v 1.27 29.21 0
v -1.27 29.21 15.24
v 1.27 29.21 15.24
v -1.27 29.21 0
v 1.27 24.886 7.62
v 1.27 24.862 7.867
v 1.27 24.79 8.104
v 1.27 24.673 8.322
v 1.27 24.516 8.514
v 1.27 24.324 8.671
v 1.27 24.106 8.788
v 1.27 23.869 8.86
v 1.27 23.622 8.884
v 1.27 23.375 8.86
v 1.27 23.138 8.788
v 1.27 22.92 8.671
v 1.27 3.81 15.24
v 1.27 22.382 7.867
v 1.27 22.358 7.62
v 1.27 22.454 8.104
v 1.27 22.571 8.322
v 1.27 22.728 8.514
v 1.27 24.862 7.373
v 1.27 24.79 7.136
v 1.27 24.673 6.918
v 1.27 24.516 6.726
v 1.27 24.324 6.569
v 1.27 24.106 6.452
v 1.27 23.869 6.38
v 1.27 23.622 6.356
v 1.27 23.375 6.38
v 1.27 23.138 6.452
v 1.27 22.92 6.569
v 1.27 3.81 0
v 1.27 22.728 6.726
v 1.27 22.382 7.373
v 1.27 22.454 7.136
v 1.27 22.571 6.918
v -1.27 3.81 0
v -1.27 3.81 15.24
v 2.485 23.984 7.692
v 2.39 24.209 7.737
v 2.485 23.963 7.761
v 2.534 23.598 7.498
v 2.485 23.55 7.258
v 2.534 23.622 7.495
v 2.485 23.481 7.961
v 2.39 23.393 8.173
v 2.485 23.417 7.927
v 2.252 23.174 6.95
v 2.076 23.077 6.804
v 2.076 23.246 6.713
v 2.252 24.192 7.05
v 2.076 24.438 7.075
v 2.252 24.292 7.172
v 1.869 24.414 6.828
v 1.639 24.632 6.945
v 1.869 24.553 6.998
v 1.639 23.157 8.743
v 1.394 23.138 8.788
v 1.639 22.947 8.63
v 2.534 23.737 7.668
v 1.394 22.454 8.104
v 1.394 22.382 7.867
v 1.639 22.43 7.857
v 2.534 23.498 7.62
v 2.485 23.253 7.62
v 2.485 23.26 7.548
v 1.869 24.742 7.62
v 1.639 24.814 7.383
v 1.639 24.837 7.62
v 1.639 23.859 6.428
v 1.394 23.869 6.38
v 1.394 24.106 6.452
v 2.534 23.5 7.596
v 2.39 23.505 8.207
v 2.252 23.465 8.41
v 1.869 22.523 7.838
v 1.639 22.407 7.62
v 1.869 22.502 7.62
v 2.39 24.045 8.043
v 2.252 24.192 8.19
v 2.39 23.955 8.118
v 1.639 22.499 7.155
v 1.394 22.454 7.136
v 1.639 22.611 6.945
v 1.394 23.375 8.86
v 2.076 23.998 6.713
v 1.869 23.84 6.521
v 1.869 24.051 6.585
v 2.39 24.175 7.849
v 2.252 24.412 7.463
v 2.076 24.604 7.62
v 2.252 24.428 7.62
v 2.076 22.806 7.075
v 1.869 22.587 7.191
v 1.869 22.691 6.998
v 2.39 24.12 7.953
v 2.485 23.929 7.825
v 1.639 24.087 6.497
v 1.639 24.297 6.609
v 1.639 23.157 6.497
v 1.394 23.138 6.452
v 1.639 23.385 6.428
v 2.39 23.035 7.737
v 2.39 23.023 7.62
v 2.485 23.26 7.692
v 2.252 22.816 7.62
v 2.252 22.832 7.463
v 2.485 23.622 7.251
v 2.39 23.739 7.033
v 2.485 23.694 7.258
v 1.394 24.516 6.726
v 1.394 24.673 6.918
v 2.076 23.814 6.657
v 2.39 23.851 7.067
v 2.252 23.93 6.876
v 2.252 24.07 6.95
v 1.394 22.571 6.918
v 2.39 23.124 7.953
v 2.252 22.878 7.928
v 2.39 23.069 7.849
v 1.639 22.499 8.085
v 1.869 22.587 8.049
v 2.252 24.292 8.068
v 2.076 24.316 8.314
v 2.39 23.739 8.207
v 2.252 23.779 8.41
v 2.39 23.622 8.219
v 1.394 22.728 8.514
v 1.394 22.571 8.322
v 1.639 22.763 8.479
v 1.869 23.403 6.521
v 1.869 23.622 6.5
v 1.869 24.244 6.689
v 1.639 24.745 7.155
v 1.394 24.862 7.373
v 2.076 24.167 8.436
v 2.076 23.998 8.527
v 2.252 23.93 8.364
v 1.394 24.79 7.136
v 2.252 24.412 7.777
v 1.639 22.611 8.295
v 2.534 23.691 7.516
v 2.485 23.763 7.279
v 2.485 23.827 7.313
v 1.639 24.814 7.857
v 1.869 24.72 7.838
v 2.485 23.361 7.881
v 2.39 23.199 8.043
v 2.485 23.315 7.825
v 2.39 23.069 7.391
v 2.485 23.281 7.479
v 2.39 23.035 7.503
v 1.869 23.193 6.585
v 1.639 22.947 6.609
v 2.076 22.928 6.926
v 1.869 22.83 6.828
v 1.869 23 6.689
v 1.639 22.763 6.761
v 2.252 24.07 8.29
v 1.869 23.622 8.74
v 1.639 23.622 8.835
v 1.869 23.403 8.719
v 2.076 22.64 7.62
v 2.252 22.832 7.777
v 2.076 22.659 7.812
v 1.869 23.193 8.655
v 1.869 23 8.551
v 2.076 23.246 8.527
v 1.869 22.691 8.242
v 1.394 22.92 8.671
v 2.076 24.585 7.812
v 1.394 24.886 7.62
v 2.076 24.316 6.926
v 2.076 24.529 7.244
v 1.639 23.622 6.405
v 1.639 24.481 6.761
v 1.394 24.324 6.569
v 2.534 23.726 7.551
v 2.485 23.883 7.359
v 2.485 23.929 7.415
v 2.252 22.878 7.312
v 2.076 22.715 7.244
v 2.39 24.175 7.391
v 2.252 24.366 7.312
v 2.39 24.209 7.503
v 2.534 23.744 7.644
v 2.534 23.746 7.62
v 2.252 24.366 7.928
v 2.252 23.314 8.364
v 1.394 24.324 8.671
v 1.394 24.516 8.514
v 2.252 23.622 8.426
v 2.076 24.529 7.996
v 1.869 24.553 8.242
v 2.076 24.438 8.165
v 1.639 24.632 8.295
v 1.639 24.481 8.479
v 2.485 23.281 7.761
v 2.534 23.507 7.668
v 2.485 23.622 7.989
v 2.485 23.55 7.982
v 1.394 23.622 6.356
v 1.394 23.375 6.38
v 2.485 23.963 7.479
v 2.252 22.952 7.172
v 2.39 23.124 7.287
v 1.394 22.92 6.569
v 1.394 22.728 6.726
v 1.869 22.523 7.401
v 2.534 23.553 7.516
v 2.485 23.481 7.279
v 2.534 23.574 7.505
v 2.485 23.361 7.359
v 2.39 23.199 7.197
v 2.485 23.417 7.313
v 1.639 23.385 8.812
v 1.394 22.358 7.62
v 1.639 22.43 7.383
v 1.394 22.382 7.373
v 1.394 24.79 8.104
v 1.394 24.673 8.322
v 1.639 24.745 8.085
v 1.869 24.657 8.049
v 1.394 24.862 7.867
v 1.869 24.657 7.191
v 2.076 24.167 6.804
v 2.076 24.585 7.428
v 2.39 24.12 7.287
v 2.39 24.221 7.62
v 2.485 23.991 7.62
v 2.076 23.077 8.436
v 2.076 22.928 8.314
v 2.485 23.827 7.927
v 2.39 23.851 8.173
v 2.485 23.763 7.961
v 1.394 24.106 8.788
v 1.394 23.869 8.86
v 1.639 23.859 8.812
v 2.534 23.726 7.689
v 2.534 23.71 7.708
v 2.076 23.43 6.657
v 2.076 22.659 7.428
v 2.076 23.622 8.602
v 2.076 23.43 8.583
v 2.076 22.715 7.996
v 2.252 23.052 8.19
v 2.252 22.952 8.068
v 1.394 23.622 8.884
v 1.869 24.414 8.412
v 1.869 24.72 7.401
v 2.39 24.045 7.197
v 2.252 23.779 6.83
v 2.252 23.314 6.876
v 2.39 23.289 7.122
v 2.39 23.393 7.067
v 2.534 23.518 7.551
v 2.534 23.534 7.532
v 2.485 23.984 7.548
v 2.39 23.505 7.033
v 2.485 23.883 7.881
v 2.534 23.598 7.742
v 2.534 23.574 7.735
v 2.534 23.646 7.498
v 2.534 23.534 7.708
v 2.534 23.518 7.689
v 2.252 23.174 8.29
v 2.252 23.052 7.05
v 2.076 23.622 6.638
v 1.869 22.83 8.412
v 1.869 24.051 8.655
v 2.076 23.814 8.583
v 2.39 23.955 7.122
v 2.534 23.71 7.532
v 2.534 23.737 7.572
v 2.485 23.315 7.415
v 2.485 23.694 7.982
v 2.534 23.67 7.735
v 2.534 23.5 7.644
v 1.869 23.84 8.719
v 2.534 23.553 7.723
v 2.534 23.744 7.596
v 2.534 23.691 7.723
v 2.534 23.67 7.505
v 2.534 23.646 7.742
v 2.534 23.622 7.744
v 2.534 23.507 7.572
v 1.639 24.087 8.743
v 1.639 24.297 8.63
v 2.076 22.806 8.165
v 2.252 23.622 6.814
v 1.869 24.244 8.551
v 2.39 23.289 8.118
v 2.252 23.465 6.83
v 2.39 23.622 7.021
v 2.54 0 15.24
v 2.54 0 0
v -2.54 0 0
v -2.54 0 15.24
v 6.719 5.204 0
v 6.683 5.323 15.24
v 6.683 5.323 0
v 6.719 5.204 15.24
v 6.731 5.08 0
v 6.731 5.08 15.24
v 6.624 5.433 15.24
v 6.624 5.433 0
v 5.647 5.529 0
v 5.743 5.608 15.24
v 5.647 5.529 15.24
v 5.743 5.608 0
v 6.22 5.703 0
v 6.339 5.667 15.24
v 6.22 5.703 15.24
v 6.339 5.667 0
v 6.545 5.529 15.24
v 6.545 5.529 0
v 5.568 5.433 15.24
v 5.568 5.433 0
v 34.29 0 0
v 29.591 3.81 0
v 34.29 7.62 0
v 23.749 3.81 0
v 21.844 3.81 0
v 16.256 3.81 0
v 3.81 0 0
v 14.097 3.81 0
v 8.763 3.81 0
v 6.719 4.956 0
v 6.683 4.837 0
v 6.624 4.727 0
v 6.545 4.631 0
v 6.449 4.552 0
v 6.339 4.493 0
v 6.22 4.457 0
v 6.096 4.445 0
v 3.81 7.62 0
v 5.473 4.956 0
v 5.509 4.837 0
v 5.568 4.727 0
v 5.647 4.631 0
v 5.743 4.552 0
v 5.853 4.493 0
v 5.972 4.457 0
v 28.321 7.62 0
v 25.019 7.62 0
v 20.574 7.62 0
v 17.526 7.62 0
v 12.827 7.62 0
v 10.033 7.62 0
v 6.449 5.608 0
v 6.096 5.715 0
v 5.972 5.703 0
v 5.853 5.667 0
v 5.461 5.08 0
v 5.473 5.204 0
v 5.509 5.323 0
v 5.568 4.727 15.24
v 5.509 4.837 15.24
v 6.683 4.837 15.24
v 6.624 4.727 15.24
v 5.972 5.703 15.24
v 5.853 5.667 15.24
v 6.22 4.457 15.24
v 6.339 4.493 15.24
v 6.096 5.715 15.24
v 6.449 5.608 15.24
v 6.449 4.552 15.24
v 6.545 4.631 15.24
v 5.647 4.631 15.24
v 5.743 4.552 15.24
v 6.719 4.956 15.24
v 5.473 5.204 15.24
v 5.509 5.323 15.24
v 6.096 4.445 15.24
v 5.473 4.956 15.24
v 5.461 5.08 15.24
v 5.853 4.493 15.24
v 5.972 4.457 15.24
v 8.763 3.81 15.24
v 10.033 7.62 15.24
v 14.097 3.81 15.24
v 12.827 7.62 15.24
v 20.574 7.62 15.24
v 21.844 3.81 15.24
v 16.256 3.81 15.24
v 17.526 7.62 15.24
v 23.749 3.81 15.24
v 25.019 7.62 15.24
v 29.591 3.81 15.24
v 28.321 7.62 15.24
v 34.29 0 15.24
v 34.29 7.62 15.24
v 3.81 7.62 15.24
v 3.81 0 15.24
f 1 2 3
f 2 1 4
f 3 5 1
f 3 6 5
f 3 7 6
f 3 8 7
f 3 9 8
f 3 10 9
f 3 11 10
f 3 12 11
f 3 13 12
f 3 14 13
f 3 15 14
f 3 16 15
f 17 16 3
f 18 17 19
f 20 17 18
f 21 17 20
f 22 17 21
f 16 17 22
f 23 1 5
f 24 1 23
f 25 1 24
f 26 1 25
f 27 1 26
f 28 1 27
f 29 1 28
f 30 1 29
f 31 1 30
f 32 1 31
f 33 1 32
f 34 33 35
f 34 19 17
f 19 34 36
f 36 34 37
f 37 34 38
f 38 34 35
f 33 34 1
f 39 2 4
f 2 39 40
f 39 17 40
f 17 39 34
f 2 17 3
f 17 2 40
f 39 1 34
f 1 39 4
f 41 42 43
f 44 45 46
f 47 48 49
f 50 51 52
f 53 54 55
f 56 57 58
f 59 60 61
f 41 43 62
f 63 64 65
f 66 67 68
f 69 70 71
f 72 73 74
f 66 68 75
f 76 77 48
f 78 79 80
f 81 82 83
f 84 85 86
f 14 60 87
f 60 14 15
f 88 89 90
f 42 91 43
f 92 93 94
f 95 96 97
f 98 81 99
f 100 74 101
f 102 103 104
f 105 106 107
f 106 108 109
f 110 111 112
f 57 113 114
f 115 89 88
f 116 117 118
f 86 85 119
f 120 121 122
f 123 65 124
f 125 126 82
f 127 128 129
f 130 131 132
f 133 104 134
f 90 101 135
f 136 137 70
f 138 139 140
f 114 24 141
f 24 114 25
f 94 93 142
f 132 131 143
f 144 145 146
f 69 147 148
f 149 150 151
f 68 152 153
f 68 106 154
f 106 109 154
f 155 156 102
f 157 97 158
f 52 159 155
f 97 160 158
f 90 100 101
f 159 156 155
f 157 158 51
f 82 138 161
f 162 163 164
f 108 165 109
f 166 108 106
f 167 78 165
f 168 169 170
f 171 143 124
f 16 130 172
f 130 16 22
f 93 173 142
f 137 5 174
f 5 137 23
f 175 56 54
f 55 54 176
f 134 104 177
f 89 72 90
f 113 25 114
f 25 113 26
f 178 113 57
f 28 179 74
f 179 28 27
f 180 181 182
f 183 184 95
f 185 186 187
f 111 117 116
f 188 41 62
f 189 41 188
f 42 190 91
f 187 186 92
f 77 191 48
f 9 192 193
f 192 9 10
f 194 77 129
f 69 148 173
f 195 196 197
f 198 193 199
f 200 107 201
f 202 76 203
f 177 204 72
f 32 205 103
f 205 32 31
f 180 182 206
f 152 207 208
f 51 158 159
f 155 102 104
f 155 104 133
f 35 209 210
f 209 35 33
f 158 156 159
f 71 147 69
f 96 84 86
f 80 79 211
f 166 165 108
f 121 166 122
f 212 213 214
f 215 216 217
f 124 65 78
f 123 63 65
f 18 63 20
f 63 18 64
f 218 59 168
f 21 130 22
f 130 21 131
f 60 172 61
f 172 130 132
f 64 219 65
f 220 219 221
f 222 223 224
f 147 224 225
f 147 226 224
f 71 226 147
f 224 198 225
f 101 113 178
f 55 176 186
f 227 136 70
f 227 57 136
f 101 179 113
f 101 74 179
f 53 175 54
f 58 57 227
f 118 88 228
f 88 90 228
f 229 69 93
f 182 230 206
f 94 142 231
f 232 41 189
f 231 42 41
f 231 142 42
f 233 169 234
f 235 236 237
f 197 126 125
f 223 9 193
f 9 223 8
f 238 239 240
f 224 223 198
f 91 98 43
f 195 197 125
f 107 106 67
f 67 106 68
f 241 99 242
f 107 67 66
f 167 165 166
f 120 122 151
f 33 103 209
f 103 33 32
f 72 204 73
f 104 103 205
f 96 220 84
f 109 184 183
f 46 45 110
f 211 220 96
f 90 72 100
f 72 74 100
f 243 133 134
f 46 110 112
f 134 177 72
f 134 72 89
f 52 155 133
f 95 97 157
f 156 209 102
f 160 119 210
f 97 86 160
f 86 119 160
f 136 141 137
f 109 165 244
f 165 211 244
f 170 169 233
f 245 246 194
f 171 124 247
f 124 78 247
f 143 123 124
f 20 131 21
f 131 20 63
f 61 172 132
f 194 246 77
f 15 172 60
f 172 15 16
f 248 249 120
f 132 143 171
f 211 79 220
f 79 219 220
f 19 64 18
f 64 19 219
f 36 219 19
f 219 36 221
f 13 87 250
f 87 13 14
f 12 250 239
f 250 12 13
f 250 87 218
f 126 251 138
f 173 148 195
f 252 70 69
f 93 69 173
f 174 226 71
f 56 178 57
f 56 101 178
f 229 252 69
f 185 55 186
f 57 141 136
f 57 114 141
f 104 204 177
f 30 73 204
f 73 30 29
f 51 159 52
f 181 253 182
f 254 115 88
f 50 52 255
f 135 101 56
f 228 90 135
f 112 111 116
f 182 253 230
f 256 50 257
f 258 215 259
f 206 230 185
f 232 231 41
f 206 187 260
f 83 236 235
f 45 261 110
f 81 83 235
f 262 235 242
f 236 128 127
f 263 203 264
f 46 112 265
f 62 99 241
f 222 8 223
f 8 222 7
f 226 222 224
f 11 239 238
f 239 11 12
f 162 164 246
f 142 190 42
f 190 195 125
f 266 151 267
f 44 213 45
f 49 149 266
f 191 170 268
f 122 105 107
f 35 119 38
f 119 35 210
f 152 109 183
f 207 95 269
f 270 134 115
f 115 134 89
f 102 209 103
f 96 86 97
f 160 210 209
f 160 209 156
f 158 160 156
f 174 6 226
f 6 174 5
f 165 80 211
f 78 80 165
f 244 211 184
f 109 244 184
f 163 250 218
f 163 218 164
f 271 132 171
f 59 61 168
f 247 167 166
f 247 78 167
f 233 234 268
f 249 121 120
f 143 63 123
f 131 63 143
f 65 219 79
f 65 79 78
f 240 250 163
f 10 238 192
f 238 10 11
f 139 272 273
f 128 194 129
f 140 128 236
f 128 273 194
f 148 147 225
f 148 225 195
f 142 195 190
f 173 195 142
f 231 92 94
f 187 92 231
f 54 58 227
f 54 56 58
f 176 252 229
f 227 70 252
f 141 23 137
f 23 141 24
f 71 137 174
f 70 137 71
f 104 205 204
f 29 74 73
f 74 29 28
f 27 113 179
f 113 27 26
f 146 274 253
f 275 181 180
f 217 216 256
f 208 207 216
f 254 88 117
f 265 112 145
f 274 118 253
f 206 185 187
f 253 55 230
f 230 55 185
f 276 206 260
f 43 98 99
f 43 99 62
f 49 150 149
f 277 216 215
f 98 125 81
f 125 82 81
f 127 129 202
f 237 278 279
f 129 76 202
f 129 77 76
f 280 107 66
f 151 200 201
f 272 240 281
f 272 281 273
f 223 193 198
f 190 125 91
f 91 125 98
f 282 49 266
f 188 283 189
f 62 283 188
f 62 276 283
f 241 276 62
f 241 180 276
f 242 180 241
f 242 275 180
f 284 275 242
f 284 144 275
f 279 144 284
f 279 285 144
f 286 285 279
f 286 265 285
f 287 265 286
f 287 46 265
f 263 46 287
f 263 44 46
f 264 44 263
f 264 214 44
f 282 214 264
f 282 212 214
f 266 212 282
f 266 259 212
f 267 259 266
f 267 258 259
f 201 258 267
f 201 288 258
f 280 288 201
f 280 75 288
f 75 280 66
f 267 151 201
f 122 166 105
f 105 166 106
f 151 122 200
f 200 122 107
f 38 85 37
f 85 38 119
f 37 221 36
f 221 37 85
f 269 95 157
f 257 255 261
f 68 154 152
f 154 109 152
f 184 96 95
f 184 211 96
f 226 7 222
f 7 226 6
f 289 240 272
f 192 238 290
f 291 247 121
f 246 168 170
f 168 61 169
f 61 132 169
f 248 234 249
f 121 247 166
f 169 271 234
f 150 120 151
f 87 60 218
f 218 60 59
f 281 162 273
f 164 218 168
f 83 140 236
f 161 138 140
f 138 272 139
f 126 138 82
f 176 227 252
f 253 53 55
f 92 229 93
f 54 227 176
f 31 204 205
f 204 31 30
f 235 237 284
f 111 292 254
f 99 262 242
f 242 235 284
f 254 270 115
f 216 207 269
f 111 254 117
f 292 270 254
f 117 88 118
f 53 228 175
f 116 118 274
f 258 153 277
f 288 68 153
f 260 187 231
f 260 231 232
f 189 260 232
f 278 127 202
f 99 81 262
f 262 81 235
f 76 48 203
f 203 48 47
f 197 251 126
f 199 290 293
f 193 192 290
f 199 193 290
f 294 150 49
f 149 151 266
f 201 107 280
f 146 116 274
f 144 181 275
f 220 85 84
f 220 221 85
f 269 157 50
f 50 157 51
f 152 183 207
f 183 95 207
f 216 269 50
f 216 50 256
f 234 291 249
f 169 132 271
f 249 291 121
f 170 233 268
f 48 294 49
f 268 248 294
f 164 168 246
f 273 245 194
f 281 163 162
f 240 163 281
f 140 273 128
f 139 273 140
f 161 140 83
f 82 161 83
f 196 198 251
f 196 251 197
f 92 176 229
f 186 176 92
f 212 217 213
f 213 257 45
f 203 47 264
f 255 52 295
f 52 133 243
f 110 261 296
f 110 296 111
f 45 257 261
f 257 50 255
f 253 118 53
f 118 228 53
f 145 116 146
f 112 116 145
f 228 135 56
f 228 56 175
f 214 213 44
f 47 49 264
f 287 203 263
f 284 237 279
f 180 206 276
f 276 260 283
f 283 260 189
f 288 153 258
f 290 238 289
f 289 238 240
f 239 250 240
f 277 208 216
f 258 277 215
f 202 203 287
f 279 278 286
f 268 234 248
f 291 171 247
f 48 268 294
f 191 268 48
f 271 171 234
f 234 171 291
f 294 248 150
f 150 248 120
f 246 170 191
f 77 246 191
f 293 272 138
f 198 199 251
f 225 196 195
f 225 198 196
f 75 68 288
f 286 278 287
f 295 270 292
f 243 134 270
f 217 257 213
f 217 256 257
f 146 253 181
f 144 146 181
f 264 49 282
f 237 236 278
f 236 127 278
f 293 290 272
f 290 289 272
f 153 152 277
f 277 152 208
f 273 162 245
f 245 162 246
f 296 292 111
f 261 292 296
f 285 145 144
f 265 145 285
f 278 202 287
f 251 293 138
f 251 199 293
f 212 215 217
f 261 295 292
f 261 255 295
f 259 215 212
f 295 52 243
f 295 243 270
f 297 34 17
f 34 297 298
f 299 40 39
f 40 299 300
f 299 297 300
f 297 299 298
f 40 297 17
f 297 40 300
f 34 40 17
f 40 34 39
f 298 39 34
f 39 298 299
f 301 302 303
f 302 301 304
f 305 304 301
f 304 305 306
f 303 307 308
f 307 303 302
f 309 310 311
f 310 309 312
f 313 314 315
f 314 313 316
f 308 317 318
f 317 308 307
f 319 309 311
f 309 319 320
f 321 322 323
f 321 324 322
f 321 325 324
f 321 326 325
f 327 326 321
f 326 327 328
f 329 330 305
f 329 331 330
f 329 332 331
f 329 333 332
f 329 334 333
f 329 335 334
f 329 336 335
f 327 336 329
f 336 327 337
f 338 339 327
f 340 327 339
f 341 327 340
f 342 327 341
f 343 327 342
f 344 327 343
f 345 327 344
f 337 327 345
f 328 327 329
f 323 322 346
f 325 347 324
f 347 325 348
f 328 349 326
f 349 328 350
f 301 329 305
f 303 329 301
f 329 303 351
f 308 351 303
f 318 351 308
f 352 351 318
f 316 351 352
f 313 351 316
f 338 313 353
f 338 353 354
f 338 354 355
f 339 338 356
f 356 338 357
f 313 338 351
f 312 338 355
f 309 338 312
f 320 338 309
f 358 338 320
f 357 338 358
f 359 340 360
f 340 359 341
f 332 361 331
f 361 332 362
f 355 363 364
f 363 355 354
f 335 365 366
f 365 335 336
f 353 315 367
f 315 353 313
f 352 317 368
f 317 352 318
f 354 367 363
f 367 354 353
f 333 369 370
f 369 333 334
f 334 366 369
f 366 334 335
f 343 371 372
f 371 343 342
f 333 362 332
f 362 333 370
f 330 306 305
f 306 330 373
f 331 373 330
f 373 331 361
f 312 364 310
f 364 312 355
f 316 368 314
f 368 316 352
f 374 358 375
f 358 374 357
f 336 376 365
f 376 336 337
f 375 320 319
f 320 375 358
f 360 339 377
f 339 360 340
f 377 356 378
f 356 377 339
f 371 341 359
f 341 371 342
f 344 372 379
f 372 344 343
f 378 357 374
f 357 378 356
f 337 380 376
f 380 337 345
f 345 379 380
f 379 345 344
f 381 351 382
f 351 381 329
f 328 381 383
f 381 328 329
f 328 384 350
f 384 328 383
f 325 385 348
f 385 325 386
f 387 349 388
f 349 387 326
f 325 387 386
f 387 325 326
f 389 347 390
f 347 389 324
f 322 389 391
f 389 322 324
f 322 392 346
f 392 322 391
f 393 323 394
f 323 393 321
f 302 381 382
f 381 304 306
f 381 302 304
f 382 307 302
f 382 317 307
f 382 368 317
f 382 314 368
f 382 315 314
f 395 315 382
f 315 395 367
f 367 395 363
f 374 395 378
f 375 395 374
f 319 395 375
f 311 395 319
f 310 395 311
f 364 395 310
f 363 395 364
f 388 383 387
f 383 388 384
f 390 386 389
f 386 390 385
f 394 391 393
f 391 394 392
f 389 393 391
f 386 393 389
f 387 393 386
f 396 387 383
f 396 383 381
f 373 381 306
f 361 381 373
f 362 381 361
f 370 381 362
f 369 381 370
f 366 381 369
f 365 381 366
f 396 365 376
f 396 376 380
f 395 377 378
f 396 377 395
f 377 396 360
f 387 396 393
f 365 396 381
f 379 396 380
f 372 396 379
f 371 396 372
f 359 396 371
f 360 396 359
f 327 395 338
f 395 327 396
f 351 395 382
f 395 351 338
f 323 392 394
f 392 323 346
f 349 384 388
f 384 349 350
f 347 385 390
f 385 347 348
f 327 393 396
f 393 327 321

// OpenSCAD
// file: FlaviaPrims.scad
// all measurements in inches
$fn=32; // round things are drawn in 32 segments

InnerWidth = 0.6;
SlotWidth = 0.3;
InnerThickness = 0.1;
TabLength = 1.0;
Offset = 0.125; 
JoinerWidth = SlotWidth * 1.5;

DoveTailSlotMul = 1.10;

BumpDia = 0.1;
BumpOffset = TabLength - 0.22; 

module GussetHub() {
  translate([-0.5*InnerWidth, -0.5 * InnerWidth, 0])
    cube([InnerWidth, InnerWidth, InnerThickness]);
}

module GussetPlate() {
  rotate([180, 0, 0]) translate([0.25*TabLength, -0.5 * InnerWidth, 0]) InnerPlate();
}

module InnerPlate() {
  cube([TabLength, InnerWidth, InnerThickness], false);
  translate([BumpOffset, InnerWidth * 0.5, InnerThickness]) sphere(d=BumpDia);
}

module InnerPlateBump() {
  InnerPlate();
  yoff = 0.5 * (InnerWidth - SlotWidth);
  translate([0, yoff, -InnerThickness]) cube([TabLength, SlotWidth, InnerThickness], false);
}

module JoinerPlate() {
  cube([TabLength, JoinerWidth, InnerThickness]);
}


module Tab() {
  translate([Offset, 0, -InnerThickness / 2]) InnerPlate(); 
}

module Hub() {
  rotate([-90, 0, 0]) cylinder(d = Offset * 2.2, h = InnerWidth); 
}

module F2x60() {
  Tab();
  rotate([0, -60, 0]) Tab();
}

module F3x60() {
  Tab();
  rotate([0, -60, 0]) Tab();
  rotate([0, -120, 0]) Tab();  
}

module F4x60() {
  F2x60();
  rotate([0, -120, 0]) F2x60();
}

module Corner() {
  InnerPlateBump();
  xshift = InnerWidth; // 0.5 * (TabLength - InnerWidth);
  yshift = InnerWidth + 0.2;
  translate([xshift, yshift, 0]) rotate([0, 0, 90]) InnerPlateBump();
  xjshift = JoinerWidth + 0.5 * (InnerWidth - JoinerWidth);
  yjshift = 0.5 * (InnerWidth - SlotWidth);
  translate([xjshift, yjshift, -2 * InnerThickness]) rotate([0, 0, 90]) JoinerPlate();
}
// main file
include <FlaviaPrims.scad>

XPitch = (TabLength * 1.5);
YPitch = TabLength * 1.2;
TailLength = InnerThickness * 1.5;
module DoveTail() {
  linear_extrude(height = InnerWidth)
    polygon(points = [ [-InnerThickness, 0], [InnerThickness, 0],
    		       [InnerThickness * 0.5, TailLength], [-InnerThickness * 0.5, TailLength] ]);
}

module TabNTail() {
  translate([0, -TailLength, 0]) DoveTail();
  translate([-InnerThickness * 0.5, 0, 0]) rotate([90, 0, 90]) InnerPlate();
}

module Slots() {
  sc = 1.05;
  difference() {
    cube([InnerWidth * 2, 3 * InnerThickness, InnerWidth]);
    union() {
    translate([InnerWidth * 0.15, InnerThickness * 2, 0]) cylinder(d = 0.5*InnerThickness, h = InnerWidth * 1.2);
    translate([InnerWidth * 0.5, 3 * InnerThickness - TailLength, -0.1 * TailLength]) scale([1.05, 1.05, 1.2]) DoveTail();
    translate([InnerWidth * 1.0, 3 * InnerThickness - TailLength, -0.1 * TailLength]) scale([1.10, 1.10, 1.2]) DoveTail();
    translate([InnerWidth * 1.5, 3 * InnerThickness - TailLength, -0.1 * TailLength]) scale([1.15, 1.15, 1.2]) DoveTail();
    }
  }
}

module ExpPair()
{
   translate([0, TailLength, 0]) TabNTail();
   translate([InnerThickness * 1.5, 0, 0]) Slots();
}

scale([25.4, 25.4, 25.4]) {
  ExpPair();
}
